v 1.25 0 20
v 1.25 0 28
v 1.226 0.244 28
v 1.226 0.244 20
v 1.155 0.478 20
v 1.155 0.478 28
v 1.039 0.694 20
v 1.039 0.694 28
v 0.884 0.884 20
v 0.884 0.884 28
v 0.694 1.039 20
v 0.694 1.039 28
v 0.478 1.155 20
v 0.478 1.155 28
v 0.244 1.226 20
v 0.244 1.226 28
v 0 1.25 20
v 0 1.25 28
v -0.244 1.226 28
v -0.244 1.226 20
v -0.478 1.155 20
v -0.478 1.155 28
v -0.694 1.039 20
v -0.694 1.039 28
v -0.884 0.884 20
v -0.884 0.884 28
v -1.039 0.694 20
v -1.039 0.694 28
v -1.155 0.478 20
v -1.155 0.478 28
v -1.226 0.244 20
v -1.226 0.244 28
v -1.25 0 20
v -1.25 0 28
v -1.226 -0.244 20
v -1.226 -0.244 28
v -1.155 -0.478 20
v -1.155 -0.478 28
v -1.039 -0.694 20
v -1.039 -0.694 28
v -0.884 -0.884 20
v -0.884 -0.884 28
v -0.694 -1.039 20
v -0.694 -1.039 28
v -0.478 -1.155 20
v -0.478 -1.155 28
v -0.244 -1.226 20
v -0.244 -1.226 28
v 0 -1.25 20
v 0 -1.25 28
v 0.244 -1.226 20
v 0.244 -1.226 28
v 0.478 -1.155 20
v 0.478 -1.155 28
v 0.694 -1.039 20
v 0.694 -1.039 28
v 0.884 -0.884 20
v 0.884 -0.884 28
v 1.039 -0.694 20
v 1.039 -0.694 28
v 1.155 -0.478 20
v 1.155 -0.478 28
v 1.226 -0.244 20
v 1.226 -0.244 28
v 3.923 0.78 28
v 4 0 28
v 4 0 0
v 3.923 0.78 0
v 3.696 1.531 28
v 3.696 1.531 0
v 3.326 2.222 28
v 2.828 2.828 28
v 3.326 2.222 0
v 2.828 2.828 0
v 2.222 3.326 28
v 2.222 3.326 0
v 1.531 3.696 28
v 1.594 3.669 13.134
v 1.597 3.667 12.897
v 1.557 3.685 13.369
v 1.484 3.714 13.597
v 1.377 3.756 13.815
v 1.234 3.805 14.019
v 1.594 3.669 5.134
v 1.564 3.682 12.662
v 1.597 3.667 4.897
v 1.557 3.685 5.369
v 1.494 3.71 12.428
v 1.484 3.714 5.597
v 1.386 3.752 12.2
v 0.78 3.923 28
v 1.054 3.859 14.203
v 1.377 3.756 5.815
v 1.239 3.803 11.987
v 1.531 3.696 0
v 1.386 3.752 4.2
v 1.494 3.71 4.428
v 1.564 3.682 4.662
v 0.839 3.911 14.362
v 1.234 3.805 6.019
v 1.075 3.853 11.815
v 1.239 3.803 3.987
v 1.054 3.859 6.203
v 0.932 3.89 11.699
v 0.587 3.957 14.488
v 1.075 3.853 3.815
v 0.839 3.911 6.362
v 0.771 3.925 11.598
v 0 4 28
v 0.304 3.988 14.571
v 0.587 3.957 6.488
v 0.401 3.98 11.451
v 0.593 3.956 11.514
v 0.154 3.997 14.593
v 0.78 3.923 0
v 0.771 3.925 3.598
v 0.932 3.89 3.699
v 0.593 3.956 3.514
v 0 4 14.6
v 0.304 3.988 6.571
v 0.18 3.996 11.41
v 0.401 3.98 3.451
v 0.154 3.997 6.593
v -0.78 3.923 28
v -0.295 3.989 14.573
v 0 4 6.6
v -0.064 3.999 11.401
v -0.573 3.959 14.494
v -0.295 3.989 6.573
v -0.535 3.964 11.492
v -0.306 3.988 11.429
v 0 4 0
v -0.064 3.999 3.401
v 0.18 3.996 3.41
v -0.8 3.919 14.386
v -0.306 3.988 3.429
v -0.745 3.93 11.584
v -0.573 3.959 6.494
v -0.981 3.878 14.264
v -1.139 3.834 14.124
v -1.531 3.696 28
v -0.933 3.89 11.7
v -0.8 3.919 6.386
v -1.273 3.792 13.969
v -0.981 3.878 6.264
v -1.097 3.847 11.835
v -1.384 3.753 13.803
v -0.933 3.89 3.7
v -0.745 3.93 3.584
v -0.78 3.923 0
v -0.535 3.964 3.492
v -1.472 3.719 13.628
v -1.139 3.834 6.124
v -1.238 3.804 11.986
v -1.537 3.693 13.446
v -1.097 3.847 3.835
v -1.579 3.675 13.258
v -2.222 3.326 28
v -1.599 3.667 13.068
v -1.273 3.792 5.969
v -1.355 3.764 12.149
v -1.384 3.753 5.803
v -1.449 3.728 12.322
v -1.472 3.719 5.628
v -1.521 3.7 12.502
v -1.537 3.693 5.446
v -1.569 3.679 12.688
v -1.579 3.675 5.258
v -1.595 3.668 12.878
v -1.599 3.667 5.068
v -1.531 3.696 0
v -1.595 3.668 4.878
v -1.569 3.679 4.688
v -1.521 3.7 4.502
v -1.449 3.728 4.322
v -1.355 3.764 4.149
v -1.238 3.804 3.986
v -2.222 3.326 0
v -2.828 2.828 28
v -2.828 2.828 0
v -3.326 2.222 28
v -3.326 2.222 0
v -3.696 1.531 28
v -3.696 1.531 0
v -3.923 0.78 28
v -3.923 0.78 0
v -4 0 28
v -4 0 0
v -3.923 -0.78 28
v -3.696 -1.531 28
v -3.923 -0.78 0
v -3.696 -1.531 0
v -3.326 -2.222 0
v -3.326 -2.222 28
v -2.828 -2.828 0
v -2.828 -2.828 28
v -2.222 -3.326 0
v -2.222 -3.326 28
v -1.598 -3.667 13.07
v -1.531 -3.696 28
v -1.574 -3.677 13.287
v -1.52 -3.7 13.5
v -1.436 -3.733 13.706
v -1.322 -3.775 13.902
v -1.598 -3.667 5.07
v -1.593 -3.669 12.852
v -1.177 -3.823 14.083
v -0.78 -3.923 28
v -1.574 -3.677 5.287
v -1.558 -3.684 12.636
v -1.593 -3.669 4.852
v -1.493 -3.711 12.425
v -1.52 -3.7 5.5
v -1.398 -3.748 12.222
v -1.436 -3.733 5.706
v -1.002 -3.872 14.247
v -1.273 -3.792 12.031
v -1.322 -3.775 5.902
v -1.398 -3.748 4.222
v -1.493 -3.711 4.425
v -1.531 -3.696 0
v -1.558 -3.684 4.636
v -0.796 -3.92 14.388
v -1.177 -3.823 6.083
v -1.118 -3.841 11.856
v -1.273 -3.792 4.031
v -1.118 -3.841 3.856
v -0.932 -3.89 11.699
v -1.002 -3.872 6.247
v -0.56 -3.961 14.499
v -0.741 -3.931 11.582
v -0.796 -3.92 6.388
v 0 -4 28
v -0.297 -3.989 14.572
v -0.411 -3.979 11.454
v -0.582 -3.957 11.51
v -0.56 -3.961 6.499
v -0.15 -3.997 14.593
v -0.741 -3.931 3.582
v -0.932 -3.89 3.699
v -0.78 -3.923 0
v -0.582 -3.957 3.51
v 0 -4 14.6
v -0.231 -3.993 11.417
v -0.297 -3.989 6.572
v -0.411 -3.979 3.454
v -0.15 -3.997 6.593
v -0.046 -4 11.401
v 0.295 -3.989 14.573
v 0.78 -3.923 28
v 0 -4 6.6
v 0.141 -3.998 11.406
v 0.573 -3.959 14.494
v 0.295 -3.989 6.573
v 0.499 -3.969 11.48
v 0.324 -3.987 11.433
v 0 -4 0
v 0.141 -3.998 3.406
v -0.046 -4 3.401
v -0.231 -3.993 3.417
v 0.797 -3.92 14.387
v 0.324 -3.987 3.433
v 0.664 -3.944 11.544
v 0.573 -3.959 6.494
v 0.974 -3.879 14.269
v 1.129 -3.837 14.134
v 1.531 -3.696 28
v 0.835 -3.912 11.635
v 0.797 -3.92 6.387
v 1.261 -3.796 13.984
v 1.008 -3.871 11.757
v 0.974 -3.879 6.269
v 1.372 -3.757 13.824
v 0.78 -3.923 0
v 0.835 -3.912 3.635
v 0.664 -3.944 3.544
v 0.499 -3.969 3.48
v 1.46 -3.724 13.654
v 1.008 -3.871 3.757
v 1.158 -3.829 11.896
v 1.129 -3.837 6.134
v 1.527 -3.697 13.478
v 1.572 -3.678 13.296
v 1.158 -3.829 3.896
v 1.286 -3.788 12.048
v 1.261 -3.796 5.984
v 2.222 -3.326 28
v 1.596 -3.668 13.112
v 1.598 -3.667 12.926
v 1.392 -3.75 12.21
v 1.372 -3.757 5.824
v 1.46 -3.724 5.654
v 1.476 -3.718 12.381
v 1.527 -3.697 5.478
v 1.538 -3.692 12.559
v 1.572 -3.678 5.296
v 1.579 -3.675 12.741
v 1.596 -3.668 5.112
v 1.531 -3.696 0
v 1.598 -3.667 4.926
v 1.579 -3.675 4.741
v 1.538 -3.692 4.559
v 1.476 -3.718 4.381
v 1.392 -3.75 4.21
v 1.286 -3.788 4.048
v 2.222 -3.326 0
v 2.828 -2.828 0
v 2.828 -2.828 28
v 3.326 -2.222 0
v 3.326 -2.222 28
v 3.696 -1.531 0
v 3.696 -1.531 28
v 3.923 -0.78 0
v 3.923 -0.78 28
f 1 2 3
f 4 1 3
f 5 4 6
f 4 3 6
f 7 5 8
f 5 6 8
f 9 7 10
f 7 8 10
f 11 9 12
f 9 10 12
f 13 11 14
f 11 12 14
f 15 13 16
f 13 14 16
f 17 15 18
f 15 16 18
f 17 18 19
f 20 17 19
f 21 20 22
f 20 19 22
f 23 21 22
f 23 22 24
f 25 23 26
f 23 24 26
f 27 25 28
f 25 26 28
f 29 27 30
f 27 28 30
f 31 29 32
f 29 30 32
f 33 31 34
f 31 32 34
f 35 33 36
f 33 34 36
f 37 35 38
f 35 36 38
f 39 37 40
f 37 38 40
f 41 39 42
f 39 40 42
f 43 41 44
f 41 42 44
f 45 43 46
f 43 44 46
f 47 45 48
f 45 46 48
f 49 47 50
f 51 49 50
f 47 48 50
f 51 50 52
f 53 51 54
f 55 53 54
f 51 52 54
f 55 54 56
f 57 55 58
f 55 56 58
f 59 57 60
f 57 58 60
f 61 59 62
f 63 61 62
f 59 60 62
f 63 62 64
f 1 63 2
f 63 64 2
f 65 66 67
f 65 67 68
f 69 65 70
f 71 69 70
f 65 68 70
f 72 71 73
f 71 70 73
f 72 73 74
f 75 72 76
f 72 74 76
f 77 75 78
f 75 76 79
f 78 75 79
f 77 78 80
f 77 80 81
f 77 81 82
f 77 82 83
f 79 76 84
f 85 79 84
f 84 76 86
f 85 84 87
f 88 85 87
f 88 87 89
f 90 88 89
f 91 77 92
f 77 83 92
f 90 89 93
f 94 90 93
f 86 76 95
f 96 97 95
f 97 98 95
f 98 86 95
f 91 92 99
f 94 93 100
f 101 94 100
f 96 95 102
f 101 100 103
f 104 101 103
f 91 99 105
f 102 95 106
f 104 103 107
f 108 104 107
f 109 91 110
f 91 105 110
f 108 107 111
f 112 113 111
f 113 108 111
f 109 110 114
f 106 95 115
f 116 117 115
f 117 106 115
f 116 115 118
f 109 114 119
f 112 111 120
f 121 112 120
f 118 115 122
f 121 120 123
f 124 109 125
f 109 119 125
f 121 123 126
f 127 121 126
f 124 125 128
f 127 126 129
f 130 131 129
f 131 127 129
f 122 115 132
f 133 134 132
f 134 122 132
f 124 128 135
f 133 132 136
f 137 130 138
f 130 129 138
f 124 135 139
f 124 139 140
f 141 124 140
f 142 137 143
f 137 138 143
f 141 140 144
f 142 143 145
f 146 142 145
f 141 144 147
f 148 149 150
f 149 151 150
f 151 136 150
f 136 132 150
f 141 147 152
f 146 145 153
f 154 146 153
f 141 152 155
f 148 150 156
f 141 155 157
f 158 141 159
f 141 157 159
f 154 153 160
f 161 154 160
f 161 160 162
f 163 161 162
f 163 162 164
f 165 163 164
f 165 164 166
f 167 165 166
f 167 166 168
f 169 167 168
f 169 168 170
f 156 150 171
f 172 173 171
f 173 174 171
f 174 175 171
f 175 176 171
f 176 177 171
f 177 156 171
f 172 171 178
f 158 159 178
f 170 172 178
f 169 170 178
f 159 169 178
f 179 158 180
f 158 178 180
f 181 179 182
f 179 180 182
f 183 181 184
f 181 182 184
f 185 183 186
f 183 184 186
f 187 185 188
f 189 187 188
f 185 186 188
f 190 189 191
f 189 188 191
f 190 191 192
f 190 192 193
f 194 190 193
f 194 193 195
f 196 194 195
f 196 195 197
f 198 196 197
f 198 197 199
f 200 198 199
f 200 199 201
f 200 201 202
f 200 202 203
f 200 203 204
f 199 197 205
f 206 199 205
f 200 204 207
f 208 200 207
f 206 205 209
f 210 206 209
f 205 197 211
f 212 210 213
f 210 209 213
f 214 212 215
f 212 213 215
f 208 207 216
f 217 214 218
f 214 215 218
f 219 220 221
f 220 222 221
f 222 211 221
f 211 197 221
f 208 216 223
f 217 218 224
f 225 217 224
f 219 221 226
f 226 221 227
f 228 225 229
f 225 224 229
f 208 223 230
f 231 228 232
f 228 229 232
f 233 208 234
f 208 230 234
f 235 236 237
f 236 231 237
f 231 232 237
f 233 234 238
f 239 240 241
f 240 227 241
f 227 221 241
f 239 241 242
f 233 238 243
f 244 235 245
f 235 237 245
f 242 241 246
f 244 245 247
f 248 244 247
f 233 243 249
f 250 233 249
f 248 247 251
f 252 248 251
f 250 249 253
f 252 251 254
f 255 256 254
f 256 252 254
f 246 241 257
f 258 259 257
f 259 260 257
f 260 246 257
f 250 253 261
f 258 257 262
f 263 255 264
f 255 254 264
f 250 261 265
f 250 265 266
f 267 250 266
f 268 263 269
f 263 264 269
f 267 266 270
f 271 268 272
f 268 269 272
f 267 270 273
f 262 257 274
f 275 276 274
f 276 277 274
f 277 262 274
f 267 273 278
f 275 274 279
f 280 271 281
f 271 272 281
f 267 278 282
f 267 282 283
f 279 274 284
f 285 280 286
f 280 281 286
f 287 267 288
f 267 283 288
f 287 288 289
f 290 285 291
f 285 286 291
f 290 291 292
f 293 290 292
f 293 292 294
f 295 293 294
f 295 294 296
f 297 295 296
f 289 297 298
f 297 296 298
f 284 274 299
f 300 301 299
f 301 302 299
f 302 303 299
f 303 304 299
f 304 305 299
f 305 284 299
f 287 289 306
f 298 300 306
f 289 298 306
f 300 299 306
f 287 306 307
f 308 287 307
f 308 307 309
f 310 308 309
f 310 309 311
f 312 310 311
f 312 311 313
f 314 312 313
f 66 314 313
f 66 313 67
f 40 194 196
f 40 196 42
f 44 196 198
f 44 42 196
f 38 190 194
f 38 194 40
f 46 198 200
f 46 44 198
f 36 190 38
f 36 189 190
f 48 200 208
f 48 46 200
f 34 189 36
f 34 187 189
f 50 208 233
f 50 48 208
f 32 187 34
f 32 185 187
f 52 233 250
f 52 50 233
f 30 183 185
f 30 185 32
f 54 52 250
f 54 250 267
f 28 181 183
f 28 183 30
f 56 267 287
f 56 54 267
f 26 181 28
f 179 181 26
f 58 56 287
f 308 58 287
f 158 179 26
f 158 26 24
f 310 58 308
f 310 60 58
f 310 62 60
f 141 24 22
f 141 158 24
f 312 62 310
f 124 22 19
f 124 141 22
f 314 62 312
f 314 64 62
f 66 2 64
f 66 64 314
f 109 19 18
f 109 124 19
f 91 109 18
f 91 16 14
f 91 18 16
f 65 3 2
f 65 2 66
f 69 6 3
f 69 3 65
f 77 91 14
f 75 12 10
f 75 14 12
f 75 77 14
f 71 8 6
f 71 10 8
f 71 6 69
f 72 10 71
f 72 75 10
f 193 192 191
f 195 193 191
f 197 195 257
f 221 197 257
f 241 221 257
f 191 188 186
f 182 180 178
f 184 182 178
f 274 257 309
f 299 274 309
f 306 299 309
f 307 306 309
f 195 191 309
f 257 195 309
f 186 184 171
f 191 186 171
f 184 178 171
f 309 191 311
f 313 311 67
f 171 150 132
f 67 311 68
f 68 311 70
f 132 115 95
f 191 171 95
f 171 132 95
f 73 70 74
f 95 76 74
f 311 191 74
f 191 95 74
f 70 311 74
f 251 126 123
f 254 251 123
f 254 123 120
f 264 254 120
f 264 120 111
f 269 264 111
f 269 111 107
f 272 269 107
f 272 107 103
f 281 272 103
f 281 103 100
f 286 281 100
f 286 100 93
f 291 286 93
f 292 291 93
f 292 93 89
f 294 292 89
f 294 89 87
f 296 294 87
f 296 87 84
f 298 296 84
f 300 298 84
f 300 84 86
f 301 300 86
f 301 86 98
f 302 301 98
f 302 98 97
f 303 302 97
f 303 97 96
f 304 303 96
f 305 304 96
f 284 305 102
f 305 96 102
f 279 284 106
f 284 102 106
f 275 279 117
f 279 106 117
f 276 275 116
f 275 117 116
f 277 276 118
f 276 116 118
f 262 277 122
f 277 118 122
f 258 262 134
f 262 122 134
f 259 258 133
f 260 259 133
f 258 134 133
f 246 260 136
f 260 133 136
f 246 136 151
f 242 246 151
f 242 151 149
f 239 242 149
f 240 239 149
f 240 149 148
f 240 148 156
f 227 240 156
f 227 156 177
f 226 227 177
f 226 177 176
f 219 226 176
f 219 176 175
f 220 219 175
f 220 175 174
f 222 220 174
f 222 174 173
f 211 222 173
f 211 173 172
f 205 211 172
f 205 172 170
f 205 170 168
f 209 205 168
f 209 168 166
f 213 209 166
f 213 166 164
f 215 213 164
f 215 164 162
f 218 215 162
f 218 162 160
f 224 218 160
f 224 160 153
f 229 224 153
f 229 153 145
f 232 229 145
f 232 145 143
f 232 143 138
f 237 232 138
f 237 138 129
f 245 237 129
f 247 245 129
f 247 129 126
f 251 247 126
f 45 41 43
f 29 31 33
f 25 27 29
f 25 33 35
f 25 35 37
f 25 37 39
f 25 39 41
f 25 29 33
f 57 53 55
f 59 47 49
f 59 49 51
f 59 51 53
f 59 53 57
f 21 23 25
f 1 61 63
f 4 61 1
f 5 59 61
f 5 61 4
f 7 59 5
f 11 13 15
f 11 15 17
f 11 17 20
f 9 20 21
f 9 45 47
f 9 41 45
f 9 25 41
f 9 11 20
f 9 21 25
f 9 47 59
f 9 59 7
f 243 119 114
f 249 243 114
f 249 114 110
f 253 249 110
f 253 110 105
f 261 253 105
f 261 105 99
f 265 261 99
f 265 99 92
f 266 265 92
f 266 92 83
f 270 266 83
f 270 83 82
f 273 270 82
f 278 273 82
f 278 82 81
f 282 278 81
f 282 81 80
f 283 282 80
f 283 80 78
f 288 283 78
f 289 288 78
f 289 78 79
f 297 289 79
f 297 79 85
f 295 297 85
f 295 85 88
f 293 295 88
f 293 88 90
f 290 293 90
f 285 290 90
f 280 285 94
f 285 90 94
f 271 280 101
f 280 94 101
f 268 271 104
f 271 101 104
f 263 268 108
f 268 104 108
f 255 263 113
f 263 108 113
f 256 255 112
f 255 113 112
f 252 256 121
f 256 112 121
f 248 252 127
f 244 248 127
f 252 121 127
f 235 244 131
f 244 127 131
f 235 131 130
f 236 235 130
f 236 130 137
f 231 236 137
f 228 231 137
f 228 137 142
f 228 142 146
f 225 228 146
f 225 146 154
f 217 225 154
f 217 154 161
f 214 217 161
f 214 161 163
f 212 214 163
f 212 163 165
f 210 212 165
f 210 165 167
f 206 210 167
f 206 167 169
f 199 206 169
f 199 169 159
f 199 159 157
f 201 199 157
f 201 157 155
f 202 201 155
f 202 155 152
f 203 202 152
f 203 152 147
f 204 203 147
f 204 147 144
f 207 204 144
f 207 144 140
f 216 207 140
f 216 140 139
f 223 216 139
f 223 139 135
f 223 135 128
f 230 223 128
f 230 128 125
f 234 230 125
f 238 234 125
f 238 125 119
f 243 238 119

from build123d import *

# Parameters (mm, degrees)
SKETCH_311_R          = 4
EXTRUDE_356_DEPTH     = 28
SKETCH_440_R          = 1.6
CUT_EXTRUDE_537_DEPTH = 30.393876913
SKETCH_1_R            = 1.25
CUT_EXTRUDE_1_DEPTH   = 8


with BuildPart() as part:
    # Sketch 311 → Extrude 356 (new body)
    with BuildSketch(Plane.XY):
        Circle(SKETCH_311_R)
    extrude(amount=EXTRUDE_356_DEPTH)

    # Sketch 440 → Cut-Extrude 537 (cut, through all)
    with BuildSketch(Plane(origin=(0, 4, 0), x_dir=(1, 0, 0), z_dir=(0, 1, 0))):
        with Locations((0, -5)):
            Circle(SKETCH_440_R)
        with Locations((0, -13)):
            Circle(SKETCH_440_R)
    extrude(amount=-CUT_EXTRUDE_537_DEPTH, mode=Mode.SUBTRACT)

    # ｽｹｯﾁ1 → ｶｯﾄ - 押し出し1 (cut)
    with BuildSketch(Plane.XY.offset(28)):
        Circle(SKETCH_1_R)
    extrude(amount=-CUT_EXTRUDE_1_DEPTH, mode=Mode.SUBTRACT)


solid = part.part
